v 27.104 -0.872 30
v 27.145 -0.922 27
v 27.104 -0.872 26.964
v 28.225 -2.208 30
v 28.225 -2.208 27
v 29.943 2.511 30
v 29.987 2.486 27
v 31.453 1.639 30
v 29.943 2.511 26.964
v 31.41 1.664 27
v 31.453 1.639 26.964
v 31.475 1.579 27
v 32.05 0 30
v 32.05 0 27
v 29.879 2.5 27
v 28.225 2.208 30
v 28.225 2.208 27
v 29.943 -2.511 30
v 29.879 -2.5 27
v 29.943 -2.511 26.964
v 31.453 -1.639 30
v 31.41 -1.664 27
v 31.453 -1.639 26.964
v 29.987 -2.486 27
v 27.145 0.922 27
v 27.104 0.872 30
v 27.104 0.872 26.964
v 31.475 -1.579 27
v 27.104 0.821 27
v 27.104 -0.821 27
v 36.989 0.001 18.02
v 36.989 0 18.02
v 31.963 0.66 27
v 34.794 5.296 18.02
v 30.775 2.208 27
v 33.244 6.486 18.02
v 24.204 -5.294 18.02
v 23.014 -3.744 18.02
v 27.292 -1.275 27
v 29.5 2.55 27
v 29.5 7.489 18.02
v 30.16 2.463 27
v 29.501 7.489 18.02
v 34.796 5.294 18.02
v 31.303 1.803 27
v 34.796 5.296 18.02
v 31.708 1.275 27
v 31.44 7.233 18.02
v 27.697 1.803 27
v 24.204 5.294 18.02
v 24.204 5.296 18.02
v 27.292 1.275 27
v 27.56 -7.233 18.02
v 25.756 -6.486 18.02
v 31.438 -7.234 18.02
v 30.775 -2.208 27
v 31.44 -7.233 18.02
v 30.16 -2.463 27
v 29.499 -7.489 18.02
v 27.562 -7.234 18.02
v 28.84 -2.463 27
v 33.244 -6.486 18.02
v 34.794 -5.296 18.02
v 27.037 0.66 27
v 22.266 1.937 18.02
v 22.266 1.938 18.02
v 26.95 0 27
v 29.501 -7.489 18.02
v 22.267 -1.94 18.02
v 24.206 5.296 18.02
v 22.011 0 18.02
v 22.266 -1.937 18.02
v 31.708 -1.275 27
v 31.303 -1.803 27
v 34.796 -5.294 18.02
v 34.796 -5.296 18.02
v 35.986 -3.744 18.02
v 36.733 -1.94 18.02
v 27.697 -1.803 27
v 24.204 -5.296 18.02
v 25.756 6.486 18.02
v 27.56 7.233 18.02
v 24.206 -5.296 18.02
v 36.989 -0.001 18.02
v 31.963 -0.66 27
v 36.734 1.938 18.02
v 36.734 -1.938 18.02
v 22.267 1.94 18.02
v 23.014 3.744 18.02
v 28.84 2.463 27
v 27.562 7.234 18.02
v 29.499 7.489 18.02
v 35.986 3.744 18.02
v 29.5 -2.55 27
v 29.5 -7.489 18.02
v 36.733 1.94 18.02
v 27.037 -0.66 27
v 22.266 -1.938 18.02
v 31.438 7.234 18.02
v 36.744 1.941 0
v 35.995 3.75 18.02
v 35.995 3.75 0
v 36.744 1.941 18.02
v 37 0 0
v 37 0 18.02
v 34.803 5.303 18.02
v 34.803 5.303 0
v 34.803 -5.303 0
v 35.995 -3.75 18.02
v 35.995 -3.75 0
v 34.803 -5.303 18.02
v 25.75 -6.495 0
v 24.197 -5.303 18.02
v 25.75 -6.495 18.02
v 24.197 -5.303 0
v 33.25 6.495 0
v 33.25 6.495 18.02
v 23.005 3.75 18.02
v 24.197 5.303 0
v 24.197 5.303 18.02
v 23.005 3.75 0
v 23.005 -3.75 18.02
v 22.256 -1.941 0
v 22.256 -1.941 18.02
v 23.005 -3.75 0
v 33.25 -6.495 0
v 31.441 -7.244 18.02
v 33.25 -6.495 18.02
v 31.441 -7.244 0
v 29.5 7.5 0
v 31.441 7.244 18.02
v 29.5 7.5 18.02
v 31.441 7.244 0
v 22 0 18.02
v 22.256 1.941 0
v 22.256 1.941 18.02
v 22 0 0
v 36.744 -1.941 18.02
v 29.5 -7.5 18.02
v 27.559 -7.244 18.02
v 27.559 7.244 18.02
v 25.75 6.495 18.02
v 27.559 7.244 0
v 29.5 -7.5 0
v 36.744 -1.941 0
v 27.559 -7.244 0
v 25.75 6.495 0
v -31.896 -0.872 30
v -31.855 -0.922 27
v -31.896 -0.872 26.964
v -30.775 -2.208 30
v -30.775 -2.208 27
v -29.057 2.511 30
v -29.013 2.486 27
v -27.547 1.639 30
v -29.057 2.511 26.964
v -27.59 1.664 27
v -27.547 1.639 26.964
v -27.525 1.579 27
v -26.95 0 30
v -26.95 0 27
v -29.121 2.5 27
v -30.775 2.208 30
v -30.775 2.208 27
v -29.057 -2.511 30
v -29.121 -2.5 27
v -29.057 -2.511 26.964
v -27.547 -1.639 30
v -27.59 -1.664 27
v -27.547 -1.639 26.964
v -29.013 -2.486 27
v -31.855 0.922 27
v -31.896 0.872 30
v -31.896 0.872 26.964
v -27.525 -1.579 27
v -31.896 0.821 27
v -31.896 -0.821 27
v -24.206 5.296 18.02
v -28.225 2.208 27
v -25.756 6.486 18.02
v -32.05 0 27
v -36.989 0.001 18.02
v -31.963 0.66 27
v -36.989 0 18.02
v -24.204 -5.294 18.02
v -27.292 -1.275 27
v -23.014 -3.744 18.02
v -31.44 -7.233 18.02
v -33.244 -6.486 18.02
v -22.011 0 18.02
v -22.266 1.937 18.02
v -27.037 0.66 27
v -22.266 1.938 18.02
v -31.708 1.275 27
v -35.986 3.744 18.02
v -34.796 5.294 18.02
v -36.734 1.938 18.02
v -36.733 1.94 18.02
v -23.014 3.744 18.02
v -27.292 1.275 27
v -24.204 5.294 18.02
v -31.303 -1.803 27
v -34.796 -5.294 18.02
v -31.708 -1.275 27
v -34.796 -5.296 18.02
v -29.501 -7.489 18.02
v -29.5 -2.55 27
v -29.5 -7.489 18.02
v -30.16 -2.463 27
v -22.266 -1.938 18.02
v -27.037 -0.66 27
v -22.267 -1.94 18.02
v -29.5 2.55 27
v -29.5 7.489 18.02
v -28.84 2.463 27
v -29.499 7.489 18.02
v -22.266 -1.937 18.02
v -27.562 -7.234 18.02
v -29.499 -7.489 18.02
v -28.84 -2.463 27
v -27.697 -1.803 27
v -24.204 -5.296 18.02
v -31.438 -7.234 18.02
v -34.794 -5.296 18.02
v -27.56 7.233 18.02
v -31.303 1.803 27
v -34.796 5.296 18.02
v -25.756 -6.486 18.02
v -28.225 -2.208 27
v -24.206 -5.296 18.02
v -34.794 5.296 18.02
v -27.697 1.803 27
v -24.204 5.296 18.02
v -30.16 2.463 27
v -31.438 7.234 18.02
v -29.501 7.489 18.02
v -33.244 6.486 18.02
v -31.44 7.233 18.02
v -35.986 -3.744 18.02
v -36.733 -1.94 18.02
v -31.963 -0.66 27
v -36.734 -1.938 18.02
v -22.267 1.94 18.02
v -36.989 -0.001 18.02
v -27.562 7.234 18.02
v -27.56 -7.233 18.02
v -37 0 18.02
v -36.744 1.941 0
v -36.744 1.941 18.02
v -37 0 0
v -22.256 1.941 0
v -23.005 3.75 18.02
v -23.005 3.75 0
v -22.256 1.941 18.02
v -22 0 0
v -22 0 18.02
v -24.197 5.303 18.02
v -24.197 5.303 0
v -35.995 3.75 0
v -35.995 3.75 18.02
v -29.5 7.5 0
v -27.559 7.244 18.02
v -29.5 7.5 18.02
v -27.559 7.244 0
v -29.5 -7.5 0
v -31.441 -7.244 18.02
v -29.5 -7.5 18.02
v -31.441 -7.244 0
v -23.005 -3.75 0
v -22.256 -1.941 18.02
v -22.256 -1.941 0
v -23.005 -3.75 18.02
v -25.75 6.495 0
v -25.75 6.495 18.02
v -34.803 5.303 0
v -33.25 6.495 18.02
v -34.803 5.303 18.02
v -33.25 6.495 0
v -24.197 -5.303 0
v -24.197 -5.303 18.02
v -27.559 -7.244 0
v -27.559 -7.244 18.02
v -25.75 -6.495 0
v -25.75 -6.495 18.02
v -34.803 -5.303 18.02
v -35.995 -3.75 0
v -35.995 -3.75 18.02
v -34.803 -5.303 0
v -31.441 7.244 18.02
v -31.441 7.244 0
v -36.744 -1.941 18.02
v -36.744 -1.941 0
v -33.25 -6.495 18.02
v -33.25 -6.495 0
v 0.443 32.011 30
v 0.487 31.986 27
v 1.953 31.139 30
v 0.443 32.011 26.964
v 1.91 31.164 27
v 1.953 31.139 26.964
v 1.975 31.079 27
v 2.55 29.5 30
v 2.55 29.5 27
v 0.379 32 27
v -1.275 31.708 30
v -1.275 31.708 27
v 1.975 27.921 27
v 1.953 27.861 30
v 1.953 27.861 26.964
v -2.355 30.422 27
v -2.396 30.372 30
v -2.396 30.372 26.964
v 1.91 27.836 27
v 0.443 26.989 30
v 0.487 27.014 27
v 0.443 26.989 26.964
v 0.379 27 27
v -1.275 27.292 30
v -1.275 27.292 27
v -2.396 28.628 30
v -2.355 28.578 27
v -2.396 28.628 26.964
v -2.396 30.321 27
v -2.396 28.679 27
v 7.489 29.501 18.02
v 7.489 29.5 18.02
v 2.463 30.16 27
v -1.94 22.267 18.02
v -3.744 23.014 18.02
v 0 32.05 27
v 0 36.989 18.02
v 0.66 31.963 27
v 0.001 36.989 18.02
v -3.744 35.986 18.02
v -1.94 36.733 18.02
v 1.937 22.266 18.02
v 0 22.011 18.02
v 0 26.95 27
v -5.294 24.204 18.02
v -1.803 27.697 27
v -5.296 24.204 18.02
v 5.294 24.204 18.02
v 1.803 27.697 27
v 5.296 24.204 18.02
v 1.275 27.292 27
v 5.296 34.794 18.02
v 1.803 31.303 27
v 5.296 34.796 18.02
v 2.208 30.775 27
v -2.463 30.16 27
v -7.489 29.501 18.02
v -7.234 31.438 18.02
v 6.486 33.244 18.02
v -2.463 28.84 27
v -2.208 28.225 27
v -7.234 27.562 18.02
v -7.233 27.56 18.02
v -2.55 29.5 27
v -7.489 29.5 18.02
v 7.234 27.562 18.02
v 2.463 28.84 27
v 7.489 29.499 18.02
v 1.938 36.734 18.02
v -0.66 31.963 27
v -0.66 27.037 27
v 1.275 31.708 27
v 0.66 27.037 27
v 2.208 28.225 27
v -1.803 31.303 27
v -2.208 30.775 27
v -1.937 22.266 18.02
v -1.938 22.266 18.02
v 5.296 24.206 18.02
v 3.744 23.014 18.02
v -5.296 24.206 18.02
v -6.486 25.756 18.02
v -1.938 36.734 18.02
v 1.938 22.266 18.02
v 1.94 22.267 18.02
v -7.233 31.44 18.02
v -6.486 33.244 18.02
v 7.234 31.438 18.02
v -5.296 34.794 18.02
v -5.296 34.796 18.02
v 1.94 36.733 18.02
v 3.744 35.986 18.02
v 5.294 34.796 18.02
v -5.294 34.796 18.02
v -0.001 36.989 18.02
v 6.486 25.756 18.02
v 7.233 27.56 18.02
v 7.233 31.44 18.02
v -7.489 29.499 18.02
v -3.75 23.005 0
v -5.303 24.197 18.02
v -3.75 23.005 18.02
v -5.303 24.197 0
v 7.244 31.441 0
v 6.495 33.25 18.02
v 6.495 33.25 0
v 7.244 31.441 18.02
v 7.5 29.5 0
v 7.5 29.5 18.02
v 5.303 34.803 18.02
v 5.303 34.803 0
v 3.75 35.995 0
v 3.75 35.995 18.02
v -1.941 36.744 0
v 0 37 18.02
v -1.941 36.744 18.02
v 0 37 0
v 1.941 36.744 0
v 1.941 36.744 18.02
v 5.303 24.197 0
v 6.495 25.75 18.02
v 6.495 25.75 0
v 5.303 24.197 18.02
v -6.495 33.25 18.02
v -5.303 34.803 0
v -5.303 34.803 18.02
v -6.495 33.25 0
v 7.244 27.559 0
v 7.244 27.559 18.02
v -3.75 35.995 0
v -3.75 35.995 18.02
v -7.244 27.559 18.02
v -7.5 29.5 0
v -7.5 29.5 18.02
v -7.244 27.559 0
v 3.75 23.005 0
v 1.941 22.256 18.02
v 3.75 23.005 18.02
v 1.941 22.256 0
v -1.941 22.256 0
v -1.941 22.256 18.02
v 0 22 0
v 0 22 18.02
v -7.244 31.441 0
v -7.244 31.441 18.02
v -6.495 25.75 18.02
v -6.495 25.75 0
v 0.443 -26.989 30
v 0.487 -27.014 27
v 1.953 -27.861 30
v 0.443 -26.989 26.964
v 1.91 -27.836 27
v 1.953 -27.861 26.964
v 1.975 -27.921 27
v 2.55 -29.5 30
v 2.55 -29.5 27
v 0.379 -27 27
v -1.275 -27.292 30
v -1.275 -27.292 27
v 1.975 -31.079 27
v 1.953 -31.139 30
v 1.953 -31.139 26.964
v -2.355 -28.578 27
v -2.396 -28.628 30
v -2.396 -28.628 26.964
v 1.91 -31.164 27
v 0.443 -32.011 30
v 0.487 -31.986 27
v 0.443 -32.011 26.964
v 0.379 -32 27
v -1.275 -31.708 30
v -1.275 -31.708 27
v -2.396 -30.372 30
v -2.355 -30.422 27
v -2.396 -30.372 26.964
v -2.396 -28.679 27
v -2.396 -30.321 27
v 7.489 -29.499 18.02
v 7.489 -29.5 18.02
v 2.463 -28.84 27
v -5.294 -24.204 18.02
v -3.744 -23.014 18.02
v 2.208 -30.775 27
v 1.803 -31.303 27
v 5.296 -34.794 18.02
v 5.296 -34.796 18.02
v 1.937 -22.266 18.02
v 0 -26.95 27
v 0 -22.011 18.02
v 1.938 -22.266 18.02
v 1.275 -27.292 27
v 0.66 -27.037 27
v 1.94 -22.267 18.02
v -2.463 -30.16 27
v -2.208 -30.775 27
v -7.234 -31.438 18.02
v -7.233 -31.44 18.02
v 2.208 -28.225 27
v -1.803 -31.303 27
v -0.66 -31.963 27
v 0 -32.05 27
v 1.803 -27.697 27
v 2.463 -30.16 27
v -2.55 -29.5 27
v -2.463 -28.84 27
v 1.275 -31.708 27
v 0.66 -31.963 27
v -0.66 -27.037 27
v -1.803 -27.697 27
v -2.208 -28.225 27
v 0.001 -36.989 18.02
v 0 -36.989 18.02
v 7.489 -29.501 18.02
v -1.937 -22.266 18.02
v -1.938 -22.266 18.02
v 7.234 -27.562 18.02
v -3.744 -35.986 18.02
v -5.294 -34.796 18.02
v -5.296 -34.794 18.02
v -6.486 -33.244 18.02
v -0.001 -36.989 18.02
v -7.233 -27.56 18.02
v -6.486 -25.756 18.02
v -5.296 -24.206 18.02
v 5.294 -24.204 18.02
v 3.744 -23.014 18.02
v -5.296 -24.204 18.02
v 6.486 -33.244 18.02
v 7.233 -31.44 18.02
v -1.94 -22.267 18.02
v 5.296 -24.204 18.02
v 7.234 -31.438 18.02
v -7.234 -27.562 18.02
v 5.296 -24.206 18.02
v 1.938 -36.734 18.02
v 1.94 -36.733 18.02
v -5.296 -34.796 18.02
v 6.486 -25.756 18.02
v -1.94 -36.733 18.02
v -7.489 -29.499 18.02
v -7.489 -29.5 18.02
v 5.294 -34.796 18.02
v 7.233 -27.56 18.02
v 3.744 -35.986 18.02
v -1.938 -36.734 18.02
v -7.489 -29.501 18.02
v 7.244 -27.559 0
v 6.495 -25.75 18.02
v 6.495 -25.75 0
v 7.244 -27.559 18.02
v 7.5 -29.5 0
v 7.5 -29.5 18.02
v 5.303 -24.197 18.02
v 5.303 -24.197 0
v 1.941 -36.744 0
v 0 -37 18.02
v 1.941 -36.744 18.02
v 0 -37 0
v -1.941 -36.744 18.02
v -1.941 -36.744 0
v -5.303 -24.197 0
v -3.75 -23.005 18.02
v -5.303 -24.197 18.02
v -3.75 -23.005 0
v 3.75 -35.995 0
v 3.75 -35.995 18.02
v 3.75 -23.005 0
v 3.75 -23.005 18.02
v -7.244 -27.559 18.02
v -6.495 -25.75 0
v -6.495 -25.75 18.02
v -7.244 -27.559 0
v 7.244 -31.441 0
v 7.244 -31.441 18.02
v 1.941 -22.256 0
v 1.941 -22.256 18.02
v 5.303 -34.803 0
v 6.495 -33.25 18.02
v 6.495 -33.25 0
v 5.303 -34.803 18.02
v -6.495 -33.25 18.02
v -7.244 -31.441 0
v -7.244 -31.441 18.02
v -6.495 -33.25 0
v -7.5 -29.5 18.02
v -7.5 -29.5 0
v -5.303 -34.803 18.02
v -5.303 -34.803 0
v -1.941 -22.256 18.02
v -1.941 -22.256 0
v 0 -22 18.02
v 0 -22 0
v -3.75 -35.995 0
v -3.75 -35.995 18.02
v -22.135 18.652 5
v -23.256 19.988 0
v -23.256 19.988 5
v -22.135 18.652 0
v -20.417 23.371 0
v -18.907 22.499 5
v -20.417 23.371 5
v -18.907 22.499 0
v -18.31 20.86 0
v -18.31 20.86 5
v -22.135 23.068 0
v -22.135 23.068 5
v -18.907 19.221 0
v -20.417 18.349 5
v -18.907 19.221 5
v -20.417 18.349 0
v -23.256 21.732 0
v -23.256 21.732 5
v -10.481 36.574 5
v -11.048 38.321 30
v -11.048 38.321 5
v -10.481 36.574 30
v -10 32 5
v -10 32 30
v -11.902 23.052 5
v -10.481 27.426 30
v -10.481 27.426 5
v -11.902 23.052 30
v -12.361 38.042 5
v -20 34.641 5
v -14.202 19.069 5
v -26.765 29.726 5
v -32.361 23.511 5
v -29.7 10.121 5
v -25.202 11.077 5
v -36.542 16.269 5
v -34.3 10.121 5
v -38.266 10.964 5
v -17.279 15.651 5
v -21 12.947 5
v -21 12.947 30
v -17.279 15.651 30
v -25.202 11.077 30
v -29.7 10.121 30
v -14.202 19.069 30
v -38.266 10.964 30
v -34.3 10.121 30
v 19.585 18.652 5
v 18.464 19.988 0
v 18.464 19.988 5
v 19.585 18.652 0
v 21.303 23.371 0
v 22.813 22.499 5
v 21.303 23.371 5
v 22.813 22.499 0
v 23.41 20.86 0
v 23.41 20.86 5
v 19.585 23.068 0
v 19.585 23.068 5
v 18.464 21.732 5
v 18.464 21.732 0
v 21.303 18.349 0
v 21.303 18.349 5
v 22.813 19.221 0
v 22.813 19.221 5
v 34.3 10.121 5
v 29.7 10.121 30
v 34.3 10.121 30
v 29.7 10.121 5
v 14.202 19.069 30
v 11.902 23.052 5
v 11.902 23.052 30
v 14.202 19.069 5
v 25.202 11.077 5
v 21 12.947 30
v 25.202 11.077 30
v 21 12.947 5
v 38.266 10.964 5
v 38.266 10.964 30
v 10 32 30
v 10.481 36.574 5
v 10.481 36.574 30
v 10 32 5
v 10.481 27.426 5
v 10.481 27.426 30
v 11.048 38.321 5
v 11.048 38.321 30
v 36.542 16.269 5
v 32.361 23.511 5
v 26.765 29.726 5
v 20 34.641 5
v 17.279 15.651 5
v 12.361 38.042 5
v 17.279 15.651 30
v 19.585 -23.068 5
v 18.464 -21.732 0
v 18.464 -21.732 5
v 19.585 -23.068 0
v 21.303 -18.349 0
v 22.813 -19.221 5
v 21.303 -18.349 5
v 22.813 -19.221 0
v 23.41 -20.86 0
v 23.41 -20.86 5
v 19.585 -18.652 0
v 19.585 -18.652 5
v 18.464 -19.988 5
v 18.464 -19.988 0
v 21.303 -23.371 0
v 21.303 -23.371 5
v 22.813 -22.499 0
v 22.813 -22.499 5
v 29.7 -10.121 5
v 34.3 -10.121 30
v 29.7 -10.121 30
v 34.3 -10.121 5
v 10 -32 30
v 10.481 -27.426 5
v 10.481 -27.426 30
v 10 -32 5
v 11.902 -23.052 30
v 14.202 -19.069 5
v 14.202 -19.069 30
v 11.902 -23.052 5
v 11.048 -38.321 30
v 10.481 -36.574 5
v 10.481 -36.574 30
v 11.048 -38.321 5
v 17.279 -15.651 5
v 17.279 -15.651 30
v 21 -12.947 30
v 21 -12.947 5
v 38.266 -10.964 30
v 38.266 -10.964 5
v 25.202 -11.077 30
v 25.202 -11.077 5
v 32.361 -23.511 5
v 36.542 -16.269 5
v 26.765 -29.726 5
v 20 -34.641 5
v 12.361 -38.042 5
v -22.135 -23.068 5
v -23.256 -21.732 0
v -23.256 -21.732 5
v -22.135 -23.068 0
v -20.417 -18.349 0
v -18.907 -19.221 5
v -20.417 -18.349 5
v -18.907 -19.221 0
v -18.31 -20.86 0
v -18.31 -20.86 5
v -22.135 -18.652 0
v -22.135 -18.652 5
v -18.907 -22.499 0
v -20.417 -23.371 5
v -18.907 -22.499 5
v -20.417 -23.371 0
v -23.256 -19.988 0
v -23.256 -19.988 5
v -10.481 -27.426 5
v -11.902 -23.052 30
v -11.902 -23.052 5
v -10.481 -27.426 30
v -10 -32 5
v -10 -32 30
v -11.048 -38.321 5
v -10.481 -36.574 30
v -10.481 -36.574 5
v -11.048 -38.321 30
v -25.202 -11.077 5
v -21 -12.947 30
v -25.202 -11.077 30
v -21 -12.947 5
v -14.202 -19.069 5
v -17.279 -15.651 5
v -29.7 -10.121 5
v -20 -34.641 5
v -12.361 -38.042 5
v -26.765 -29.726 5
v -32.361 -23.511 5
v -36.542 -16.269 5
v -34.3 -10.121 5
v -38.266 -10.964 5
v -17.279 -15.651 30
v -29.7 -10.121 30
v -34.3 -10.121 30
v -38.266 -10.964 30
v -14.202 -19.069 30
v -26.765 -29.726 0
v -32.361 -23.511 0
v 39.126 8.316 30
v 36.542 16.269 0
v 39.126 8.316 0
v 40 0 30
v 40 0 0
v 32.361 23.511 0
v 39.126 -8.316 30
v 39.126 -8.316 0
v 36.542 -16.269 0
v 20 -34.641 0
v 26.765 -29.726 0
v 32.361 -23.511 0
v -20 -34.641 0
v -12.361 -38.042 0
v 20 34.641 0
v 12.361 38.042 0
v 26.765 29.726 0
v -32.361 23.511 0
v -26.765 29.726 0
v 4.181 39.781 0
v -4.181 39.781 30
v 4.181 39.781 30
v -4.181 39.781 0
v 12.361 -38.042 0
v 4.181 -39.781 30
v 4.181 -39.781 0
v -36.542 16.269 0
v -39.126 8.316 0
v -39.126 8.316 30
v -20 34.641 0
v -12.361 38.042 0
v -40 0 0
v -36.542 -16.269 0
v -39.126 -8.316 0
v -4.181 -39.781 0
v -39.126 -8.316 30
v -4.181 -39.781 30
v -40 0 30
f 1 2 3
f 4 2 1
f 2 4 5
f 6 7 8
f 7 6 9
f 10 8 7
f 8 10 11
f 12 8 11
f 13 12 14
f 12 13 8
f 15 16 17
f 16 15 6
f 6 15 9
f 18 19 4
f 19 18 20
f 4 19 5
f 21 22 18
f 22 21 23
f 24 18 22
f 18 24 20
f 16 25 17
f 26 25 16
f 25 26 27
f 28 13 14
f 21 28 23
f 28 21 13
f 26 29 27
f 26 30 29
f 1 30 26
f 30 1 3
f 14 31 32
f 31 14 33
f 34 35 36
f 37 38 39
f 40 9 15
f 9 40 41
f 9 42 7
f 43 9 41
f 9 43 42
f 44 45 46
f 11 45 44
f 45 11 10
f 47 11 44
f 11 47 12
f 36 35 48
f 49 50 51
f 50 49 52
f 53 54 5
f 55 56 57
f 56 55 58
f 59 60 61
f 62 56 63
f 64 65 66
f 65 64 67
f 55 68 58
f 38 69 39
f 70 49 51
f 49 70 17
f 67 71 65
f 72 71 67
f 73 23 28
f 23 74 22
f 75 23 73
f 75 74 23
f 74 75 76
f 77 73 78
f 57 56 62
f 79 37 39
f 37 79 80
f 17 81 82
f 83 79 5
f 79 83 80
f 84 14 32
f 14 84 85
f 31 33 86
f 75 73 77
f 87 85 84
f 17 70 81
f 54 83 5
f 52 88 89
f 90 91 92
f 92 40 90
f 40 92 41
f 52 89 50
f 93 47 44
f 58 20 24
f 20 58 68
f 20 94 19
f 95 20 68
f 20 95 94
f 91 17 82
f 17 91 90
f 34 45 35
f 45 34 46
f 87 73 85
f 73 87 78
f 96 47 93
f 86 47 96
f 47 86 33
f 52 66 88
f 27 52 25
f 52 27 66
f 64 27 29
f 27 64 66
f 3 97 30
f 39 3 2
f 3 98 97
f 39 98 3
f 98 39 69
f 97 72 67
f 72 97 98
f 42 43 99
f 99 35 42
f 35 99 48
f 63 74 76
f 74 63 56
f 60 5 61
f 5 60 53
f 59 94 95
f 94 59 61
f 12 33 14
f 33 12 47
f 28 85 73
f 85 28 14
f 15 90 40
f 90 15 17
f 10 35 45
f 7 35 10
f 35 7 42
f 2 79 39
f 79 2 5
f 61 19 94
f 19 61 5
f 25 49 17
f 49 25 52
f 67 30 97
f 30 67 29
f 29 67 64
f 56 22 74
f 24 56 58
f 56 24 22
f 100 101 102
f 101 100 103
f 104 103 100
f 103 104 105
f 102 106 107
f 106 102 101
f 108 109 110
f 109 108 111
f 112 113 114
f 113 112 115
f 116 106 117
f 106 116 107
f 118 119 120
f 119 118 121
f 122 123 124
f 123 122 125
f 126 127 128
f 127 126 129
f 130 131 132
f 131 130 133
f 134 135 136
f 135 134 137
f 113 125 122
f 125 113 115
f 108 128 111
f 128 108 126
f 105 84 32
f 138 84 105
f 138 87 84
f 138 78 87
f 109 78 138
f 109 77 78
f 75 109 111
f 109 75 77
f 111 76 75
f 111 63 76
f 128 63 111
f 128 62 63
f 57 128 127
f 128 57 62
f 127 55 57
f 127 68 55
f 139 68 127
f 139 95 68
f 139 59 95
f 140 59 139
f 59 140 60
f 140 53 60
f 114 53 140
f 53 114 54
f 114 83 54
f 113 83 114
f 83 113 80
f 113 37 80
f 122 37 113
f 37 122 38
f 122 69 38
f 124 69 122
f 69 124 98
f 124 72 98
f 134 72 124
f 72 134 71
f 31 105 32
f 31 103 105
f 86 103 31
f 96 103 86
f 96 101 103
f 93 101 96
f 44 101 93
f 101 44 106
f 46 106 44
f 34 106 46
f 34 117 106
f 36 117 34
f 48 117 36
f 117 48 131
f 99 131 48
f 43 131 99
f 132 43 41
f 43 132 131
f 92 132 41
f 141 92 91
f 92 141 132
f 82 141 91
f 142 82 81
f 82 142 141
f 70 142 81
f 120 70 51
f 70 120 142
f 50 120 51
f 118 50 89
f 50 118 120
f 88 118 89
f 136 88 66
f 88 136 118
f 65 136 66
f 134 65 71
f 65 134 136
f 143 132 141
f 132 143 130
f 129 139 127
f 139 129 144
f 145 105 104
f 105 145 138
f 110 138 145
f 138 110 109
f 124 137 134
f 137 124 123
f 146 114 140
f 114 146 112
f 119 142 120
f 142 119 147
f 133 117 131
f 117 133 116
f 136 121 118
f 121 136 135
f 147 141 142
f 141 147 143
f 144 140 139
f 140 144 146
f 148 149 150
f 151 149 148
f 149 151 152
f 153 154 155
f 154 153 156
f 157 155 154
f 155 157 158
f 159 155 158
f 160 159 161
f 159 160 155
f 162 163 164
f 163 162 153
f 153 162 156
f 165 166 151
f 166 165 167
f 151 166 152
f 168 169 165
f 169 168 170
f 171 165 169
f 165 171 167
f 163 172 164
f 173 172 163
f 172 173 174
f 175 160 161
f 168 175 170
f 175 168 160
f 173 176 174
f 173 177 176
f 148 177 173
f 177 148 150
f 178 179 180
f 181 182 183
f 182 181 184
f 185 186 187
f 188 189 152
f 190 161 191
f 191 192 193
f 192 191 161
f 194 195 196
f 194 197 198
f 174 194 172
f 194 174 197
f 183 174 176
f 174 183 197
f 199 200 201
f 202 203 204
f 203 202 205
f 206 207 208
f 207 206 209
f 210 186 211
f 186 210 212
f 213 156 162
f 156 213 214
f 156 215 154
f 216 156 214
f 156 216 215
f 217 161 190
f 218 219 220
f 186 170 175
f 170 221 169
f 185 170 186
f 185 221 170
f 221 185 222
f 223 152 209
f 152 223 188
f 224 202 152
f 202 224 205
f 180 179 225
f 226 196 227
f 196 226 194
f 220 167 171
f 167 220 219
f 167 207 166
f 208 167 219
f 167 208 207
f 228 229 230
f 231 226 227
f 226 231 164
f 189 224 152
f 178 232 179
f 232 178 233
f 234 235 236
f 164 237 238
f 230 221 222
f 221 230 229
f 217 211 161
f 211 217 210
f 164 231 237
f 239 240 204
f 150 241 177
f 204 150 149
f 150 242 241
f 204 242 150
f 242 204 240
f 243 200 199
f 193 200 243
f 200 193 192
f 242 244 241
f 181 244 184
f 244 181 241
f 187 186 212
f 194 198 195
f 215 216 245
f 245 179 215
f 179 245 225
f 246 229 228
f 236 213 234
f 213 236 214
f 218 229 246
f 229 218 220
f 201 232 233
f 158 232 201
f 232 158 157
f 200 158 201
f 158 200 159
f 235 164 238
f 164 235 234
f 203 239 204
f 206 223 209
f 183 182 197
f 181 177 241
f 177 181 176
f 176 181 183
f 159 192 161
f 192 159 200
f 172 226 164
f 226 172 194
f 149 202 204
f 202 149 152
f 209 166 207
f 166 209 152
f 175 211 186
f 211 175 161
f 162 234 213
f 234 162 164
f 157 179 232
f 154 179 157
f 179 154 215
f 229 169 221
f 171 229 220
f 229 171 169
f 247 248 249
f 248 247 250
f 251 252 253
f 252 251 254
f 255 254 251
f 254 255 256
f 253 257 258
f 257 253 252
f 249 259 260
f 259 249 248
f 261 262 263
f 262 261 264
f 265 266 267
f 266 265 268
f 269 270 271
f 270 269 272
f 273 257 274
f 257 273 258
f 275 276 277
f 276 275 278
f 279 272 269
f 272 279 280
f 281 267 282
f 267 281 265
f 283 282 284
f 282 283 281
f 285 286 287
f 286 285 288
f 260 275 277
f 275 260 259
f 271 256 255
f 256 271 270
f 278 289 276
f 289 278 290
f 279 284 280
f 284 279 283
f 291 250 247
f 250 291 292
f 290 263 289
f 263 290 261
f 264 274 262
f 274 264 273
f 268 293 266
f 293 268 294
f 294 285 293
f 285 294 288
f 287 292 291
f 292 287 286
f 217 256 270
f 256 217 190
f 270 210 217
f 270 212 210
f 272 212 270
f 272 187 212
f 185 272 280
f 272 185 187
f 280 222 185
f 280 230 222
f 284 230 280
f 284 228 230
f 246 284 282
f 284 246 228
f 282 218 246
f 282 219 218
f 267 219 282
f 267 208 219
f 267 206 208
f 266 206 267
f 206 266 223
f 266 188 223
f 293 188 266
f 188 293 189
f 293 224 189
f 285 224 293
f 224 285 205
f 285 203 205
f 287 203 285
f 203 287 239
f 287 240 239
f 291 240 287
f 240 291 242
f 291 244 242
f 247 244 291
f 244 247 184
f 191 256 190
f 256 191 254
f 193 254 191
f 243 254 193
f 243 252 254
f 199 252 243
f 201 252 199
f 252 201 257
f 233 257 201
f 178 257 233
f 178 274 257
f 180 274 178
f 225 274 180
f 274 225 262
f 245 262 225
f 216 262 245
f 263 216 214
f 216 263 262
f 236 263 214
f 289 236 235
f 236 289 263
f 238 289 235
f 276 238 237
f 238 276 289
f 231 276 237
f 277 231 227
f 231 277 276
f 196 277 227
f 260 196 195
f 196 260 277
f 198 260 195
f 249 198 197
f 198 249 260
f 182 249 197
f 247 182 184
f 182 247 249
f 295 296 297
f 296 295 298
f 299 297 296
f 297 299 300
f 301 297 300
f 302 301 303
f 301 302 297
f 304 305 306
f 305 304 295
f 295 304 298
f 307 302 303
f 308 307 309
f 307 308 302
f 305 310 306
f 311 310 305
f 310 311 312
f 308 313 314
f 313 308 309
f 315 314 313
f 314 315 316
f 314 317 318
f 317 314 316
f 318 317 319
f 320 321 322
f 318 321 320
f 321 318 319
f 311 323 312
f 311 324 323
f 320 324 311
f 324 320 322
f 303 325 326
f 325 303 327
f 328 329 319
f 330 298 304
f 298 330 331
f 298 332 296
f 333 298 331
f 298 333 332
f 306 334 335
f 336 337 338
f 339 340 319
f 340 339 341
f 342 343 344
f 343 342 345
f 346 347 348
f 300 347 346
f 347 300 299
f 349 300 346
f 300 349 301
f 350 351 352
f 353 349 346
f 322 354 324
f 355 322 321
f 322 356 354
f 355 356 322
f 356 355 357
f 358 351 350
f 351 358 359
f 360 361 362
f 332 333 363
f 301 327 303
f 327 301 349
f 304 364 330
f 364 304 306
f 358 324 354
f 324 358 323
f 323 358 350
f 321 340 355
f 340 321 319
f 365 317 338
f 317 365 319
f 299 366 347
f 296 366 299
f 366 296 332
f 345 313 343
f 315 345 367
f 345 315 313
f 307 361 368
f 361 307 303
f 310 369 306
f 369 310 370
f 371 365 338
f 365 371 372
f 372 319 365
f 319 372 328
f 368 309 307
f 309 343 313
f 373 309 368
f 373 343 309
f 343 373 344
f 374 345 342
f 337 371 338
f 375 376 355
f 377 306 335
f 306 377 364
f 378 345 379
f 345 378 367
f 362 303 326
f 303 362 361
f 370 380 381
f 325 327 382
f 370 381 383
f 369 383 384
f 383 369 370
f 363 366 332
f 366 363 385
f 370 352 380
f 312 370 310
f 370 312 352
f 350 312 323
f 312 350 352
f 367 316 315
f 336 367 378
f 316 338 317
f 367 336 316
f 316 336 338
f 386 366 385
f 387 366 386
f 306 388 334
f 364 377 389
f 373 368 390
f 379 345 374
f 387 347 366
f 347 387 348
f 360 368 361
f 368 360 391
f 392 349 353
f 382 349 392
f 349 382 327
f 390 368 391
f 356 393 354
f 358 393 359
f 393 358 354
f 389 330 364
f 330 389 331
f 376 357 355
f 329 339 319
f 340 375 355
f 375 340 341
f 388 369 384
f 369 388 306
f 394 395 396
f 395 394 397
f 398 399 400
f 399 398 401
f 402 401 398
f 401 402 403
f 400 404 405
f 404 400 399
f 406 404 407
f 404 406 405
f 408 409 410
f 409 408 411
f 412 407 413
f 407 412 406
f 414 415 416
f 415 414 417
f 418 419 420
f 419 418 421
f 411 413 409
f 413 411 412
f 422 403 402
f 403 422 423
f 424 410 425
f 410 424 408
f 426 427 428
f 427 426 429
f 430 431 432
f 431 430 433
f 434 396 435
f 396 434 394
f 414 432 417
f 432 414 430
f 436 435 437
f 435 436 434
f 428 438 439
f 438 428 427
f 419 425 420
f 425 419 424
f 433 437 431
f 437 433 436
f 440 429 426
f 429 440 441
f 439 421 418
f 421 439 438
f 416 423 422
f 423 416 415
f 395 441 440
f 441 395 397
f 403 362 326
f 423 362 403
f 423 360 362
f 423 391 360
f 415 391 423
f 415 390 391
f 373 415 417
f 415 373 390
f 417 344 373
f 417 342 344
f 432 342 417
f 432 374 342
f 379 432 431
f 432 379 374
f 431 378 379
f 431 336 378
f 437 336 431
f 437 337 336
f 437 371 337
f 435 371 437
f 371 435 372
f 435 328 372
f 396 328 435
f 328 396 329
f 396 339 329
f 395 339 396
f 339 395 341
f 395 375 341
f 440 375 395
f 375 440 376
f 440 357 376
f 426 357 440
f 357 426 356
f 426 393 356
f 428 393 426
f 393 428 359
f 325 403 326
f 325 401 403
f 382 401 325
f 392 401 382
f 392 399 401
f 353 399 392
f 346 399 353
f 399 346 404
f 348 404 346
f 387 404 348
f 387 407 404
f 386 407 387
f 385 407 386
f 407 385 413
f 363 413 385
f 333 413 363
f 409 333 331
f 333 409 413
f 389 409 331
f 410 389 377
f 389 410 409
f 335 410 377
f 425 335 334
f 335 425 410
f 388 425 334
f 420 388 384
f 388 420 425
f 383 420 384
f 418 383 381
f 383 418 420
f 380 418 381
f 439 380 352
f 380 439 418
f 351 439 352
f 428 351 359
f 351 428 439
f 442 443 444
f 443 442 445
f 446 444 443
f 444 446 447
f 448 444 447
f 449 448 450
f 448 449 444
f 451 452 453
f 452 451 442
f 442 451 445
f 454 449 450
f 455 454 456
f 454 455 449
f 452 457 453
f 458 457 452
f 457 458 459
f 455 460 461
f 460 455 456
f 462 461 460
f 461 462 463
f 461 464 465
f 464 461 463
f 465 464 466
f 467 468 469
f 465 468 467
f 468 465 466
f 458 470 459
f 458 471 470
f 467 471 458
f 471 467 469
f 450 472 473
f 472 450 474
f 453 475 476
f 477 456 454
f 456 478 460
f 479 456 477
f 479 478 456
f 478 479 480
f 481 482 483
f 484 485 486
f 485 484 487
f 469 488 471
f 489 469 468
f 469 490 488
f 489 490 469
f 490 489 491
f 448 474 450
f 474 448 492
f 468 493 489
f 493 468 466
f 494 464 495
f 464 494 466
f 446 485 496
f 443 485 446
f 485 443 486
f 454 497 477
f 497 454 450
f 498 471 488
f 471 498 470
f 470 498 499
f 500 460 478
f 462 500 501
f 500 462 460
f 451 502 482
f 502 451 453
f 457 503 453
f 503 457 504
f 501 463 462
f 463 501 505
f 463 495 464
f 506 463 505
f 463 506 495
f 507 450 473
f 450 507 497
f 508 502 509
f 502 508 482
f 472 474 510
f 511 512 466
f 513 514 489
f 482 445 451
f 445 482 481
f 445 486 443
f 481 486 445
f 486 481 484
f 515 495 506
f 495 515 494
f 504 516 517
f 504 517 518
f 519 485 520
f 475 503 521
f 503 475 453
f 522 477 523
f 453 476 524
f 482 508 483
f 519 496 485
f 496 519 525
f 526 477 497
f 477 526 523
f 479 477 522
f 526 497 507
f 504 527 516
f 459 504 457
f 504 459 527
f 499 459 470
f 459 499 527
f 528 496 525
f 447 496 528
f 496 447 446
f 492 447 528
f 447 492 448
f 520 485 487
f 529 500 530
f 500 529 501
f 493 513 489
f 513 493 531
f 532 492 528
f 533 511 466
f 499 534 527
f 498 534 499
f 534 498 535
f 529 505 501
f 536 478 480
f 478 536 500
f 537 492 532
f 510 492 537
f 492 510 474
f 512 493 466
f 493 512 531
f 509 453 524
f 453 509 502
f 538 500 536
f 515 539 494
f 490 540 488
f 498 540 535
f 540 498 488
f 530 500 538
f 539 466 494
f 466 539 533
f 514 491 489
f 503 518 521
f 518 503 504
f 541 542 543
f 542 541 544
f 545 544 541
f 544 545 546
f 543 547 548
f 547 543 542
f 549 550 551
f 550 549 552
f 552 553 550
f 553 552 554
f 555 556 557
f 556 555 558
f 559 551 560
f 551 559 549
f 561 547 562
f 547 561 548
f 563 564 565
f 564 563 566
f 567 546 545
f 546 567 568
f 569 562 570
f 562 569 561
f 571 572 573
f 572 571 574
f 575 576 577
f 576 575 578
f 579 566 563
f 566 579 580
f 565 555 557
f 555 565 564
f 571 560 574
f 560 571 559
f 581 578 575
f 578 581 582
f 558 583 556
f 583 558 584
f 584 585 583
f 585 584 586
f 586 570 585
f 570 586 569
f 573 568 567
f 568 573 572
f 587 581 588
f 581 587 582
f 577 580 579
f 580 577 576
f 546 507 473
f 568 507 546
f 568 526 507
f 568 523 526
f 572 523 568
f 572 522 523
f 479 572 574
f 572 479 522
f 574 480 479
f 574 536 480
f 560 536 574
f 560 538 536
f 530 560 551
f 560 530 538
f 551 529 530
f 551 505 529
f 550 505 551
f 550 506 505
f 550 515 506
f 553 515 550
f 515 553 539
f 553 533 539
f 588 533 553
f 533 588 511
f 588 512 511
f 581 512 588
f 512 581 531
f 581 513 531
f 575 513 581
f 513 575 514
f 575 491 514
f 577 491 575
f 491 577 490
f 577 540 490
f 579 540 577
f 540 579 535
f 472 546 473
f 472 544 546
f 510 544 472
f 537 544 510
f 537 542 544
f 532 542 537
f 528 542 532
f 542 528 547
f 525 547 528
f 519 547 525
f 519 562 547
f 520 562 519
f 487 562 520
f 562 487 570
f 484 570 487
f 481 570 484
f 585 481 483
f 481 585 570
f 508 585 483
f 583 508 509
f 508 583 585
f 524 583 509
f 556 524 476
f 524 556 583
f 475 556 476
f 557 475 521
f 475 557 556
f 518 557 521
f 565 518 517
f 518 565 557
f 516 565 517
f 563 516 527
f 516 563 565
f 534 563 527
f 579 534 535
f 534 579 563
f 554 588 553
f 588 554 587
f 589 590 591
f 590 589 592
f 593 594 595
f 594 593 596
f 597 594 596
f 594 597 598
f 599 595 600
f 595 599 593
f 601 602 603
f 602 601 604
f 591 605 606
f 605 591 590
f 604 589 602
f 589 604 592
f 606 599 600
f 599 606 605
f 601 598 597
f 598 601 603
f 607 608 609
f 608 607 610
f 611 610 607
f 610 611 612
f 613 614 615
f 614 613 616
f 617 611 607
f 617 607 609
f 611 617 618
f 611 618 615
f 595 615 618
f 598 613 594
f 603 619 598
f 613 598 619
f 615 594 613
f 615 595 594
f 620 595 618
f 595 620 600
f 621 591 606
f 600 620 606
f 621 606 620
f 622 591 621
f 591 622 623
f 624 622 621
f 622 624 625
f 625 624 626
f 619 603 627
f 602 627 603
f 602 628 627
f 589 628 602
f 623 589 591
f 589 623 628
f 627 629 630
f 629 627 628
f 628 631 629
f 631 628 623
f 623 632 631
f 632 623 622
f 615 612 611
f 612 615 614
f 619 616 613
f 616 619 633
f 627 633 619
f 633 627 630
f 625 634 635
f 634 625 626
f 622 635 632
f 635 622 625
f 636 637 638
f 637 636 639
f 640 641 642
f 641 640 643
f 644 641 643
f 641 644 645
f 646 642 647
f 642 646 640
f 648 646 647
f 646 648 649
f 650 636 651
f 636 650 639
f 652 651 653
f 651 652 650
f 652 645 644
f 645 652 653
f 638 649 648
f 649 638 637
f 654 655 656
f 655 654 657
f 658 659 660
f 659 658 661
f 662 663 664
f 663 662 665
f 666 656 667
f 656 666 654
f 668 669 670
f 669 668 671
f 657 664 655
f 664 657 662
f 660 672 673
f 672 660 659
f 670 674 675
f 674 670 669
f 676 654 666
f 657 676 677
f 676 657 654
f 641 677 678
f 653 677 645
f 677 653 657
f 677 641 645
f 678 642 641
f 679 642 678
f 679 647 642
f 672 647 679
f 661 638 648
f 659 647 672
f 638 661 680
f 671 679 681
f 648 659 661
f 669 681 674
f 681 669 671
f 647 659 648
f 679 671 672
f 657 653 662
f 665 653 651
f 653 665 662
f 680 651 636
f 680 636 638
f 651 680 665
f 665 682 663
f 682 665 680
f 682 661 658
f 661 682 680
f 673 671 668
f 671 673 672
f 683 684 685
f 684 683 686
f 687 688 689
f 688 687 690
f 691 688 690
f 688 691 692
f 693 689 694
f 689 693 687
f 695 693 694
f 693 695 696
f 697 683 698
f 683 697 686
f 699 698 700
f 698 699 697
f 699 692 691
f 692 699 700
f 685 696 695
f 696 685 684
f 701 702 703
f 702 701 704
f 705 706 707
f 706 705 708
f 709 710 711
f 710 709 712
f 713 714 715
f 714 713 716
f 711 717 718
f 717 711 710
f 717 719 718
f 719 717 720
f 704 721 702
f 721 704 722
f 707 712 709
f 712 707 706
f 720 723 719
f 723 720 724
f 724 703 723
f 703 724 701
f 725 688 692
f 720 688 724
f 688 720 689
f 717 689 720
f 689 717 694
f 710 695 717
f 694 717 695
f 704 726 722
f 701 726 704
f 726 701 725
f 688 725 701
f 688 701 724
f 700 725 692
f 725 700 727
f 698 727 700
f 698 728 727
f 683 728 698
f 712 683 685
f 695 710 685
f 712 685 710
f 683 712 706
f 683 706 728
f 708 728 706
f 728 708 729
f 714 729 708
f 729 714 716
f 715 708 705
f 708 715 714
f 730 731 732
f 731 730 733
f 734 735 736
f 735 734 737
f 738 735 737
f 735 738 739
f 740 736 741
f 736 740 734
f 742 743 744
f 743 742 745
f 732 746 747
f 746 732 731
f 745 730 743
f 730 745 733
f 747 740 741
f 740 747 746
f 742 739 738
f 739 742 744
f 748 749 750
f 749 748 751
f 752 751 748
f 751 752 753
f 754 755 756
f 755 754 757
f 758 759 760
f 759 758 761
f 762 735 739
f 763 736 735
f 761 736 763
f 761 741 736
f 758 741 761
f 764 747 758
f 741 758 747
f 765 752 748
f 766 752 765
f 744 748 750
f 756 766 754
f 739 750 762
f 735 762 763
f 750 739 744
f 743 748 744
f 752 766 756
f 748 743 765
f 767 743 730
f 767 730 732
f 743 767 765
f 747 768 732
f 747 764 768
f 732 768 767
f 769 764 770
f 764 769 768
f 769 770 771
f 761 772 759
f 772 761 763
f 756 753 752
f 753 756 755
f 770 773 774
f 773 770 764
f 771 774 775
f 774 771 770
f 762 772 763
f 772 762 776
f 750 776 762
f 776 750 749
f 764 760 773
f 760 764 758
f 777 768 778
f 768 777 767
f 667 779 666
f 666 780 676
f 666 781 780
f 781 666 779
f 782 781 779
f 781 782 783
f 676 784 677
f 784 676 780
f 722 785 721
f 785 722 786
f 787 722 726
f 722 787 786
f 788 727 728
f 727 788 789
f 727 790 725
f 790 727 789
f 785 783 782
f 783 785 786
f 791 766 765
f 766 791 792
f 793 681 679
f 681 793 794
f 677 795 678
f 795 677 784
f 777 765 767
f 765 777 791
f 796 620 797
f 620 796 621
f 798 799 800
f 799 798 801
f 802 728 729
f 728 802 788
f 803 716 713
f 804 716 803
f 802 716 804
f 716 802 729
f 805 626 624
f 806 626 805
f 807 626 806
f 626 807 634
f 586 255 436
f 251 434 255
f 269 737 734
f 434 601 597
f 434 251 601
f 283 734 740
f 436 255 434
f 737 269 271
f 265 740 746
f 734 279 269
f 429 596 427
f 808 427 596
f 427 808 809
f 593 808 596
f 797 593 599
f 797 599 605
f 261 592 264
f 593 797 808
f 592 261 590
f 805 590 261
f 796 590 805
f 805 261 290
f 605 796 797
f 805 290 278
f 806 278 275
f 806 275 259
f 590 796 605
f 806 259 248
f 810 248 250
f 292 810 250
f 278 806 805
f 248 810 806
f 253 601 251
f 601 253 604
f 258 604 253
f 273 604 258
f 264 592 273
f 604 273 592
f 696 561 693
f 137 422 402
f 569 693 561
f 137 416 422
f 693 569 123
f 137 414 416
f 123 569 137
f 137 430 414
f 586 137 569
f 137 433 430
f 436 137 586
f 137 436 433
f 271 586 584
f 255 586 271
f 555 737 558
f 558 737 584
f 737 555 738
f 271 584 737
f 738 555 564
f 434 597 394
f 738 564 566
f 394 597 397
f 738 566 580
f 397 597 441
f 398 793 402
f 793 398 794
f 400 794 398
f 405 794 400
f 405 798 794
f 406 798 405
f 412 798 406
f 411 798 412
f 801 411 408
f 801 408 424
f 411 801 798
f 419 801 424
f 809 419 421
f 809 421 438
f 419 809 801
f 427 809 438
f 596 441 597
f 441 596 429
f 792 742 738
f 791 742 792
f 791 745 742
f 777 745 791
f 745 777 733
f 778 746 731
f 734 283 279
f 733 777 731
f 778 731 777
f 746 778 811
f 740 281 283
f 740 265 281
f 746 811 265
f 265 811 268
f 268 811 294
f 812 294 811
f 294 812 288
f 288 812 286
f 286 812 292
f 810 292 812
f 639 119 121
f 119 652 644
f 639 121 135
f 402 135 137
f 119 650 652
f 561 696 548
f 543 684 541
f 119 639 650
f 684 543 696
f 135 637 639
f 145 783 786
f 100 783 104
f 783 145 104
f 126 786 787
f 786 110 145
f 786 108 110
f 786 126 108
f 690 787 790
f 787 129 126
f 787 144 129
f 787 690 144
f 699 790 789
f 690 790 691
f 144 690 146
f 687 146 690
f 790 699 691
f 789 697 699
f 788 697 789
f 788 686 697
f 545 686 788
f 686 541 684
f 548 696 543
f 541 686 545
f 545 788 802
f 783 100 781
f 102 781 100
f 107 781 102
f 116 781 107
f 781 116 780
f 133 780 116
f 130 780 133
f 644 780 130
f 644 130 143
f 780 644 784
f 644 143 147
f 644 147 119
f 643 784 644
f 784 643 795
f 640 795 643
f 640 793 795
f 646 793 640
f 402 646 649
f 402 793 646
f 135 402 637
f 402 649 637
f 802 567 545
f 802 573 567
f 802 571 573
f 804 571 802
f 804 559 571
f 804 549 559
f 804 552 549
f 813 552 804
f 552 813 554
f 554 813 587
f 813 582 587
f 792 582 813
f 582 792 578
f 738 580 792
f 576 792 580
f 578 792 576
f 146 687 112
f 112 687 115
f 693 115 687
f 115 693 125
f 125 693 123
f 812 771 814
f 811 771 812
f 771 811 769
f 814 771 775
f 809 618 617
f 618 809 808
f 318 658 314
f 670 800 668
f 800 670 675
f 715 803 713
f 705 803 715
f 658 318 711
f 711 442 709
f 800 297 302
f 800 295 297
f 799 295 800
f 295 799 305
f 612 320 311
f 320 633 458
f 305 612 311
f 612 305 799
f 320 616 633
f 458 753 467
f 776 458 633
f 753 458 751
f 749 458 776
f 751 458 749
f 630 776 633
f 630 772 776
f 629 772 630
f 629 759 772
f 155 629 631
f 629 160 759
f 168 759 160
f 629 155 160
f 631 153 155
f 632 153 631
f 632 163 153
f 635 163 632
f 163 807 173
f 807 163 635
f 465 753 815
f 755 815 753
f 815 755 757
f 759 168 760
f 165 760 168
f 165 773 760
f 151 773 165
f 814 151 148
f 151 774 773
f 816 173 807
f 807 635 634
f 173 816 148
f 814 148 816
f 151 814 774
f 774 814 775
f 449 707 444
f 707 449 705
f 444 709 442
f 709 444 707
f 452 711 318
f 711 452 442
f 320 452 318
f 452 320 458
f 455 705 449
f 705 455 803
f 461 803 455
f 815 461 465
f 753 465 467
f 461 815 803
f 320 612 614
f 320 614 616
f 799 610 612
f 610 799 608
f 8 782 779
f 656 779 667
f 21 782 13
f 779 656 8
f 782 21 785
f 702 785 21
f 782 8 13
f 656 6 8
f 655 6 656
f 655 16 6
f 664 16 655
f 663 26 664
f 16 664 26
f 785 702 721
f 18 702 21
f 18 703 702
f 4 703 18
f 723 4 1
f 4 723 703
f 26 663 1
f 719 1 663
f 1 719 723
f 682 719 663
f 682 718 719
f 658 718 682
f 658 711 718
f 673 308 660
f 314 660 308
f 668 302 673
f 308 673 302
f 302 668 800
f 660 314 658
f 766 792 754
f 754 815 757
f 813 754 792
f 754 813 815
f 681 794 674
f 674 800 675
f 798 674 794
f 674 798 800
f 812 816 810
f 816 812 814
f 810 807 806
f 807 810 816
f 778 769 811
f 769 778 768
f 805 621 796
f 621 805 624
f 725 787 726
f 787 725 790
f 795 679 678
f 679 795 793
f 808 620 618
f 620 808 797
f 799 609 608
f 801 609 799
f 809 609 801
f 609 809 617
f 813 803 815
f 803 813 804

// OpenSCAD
bolt_rad = 2.55;
driver_rad = 7.5;
base_height = 5;
full_height = 30;

module bothole(x, y) {
    union() {
        translate([x, y, -5])
            cylinder(r=bolt_rad, h=(full_height + 20));
        translate([x, y, 3])
            cylinder(r1=bolt_rad, r2=driver_rad, h=9);
        translate([x, y, 11.98])
            cylinder(r=driver_rad, h=50);
    }
}

module tophole(x, y) {
    translate([0, 0, full_height])
        mirror([0,0,1])
            bothole(x, y);
}

module hole2(dx, dy) {
    translate([dx*20.86, dy*20.86, -5])
        cylinder(r=2.55, h=(full_height + 10));
    translate([dx*32, dy*32, base_height])
        cylinder(r=22, h=(full_height + 10));
}

difference() {
    cylinder(r=40, h=full_height);
    tophole(29.5, 0);
    tophole(-29.5, 0);
    tophole(0, 29.5);
    tophole(0, -29.5);
    hole2(-1, 1);
    hole2(1, 1);
    hole2(1, -1);
    hole2(-1, -1);
}
